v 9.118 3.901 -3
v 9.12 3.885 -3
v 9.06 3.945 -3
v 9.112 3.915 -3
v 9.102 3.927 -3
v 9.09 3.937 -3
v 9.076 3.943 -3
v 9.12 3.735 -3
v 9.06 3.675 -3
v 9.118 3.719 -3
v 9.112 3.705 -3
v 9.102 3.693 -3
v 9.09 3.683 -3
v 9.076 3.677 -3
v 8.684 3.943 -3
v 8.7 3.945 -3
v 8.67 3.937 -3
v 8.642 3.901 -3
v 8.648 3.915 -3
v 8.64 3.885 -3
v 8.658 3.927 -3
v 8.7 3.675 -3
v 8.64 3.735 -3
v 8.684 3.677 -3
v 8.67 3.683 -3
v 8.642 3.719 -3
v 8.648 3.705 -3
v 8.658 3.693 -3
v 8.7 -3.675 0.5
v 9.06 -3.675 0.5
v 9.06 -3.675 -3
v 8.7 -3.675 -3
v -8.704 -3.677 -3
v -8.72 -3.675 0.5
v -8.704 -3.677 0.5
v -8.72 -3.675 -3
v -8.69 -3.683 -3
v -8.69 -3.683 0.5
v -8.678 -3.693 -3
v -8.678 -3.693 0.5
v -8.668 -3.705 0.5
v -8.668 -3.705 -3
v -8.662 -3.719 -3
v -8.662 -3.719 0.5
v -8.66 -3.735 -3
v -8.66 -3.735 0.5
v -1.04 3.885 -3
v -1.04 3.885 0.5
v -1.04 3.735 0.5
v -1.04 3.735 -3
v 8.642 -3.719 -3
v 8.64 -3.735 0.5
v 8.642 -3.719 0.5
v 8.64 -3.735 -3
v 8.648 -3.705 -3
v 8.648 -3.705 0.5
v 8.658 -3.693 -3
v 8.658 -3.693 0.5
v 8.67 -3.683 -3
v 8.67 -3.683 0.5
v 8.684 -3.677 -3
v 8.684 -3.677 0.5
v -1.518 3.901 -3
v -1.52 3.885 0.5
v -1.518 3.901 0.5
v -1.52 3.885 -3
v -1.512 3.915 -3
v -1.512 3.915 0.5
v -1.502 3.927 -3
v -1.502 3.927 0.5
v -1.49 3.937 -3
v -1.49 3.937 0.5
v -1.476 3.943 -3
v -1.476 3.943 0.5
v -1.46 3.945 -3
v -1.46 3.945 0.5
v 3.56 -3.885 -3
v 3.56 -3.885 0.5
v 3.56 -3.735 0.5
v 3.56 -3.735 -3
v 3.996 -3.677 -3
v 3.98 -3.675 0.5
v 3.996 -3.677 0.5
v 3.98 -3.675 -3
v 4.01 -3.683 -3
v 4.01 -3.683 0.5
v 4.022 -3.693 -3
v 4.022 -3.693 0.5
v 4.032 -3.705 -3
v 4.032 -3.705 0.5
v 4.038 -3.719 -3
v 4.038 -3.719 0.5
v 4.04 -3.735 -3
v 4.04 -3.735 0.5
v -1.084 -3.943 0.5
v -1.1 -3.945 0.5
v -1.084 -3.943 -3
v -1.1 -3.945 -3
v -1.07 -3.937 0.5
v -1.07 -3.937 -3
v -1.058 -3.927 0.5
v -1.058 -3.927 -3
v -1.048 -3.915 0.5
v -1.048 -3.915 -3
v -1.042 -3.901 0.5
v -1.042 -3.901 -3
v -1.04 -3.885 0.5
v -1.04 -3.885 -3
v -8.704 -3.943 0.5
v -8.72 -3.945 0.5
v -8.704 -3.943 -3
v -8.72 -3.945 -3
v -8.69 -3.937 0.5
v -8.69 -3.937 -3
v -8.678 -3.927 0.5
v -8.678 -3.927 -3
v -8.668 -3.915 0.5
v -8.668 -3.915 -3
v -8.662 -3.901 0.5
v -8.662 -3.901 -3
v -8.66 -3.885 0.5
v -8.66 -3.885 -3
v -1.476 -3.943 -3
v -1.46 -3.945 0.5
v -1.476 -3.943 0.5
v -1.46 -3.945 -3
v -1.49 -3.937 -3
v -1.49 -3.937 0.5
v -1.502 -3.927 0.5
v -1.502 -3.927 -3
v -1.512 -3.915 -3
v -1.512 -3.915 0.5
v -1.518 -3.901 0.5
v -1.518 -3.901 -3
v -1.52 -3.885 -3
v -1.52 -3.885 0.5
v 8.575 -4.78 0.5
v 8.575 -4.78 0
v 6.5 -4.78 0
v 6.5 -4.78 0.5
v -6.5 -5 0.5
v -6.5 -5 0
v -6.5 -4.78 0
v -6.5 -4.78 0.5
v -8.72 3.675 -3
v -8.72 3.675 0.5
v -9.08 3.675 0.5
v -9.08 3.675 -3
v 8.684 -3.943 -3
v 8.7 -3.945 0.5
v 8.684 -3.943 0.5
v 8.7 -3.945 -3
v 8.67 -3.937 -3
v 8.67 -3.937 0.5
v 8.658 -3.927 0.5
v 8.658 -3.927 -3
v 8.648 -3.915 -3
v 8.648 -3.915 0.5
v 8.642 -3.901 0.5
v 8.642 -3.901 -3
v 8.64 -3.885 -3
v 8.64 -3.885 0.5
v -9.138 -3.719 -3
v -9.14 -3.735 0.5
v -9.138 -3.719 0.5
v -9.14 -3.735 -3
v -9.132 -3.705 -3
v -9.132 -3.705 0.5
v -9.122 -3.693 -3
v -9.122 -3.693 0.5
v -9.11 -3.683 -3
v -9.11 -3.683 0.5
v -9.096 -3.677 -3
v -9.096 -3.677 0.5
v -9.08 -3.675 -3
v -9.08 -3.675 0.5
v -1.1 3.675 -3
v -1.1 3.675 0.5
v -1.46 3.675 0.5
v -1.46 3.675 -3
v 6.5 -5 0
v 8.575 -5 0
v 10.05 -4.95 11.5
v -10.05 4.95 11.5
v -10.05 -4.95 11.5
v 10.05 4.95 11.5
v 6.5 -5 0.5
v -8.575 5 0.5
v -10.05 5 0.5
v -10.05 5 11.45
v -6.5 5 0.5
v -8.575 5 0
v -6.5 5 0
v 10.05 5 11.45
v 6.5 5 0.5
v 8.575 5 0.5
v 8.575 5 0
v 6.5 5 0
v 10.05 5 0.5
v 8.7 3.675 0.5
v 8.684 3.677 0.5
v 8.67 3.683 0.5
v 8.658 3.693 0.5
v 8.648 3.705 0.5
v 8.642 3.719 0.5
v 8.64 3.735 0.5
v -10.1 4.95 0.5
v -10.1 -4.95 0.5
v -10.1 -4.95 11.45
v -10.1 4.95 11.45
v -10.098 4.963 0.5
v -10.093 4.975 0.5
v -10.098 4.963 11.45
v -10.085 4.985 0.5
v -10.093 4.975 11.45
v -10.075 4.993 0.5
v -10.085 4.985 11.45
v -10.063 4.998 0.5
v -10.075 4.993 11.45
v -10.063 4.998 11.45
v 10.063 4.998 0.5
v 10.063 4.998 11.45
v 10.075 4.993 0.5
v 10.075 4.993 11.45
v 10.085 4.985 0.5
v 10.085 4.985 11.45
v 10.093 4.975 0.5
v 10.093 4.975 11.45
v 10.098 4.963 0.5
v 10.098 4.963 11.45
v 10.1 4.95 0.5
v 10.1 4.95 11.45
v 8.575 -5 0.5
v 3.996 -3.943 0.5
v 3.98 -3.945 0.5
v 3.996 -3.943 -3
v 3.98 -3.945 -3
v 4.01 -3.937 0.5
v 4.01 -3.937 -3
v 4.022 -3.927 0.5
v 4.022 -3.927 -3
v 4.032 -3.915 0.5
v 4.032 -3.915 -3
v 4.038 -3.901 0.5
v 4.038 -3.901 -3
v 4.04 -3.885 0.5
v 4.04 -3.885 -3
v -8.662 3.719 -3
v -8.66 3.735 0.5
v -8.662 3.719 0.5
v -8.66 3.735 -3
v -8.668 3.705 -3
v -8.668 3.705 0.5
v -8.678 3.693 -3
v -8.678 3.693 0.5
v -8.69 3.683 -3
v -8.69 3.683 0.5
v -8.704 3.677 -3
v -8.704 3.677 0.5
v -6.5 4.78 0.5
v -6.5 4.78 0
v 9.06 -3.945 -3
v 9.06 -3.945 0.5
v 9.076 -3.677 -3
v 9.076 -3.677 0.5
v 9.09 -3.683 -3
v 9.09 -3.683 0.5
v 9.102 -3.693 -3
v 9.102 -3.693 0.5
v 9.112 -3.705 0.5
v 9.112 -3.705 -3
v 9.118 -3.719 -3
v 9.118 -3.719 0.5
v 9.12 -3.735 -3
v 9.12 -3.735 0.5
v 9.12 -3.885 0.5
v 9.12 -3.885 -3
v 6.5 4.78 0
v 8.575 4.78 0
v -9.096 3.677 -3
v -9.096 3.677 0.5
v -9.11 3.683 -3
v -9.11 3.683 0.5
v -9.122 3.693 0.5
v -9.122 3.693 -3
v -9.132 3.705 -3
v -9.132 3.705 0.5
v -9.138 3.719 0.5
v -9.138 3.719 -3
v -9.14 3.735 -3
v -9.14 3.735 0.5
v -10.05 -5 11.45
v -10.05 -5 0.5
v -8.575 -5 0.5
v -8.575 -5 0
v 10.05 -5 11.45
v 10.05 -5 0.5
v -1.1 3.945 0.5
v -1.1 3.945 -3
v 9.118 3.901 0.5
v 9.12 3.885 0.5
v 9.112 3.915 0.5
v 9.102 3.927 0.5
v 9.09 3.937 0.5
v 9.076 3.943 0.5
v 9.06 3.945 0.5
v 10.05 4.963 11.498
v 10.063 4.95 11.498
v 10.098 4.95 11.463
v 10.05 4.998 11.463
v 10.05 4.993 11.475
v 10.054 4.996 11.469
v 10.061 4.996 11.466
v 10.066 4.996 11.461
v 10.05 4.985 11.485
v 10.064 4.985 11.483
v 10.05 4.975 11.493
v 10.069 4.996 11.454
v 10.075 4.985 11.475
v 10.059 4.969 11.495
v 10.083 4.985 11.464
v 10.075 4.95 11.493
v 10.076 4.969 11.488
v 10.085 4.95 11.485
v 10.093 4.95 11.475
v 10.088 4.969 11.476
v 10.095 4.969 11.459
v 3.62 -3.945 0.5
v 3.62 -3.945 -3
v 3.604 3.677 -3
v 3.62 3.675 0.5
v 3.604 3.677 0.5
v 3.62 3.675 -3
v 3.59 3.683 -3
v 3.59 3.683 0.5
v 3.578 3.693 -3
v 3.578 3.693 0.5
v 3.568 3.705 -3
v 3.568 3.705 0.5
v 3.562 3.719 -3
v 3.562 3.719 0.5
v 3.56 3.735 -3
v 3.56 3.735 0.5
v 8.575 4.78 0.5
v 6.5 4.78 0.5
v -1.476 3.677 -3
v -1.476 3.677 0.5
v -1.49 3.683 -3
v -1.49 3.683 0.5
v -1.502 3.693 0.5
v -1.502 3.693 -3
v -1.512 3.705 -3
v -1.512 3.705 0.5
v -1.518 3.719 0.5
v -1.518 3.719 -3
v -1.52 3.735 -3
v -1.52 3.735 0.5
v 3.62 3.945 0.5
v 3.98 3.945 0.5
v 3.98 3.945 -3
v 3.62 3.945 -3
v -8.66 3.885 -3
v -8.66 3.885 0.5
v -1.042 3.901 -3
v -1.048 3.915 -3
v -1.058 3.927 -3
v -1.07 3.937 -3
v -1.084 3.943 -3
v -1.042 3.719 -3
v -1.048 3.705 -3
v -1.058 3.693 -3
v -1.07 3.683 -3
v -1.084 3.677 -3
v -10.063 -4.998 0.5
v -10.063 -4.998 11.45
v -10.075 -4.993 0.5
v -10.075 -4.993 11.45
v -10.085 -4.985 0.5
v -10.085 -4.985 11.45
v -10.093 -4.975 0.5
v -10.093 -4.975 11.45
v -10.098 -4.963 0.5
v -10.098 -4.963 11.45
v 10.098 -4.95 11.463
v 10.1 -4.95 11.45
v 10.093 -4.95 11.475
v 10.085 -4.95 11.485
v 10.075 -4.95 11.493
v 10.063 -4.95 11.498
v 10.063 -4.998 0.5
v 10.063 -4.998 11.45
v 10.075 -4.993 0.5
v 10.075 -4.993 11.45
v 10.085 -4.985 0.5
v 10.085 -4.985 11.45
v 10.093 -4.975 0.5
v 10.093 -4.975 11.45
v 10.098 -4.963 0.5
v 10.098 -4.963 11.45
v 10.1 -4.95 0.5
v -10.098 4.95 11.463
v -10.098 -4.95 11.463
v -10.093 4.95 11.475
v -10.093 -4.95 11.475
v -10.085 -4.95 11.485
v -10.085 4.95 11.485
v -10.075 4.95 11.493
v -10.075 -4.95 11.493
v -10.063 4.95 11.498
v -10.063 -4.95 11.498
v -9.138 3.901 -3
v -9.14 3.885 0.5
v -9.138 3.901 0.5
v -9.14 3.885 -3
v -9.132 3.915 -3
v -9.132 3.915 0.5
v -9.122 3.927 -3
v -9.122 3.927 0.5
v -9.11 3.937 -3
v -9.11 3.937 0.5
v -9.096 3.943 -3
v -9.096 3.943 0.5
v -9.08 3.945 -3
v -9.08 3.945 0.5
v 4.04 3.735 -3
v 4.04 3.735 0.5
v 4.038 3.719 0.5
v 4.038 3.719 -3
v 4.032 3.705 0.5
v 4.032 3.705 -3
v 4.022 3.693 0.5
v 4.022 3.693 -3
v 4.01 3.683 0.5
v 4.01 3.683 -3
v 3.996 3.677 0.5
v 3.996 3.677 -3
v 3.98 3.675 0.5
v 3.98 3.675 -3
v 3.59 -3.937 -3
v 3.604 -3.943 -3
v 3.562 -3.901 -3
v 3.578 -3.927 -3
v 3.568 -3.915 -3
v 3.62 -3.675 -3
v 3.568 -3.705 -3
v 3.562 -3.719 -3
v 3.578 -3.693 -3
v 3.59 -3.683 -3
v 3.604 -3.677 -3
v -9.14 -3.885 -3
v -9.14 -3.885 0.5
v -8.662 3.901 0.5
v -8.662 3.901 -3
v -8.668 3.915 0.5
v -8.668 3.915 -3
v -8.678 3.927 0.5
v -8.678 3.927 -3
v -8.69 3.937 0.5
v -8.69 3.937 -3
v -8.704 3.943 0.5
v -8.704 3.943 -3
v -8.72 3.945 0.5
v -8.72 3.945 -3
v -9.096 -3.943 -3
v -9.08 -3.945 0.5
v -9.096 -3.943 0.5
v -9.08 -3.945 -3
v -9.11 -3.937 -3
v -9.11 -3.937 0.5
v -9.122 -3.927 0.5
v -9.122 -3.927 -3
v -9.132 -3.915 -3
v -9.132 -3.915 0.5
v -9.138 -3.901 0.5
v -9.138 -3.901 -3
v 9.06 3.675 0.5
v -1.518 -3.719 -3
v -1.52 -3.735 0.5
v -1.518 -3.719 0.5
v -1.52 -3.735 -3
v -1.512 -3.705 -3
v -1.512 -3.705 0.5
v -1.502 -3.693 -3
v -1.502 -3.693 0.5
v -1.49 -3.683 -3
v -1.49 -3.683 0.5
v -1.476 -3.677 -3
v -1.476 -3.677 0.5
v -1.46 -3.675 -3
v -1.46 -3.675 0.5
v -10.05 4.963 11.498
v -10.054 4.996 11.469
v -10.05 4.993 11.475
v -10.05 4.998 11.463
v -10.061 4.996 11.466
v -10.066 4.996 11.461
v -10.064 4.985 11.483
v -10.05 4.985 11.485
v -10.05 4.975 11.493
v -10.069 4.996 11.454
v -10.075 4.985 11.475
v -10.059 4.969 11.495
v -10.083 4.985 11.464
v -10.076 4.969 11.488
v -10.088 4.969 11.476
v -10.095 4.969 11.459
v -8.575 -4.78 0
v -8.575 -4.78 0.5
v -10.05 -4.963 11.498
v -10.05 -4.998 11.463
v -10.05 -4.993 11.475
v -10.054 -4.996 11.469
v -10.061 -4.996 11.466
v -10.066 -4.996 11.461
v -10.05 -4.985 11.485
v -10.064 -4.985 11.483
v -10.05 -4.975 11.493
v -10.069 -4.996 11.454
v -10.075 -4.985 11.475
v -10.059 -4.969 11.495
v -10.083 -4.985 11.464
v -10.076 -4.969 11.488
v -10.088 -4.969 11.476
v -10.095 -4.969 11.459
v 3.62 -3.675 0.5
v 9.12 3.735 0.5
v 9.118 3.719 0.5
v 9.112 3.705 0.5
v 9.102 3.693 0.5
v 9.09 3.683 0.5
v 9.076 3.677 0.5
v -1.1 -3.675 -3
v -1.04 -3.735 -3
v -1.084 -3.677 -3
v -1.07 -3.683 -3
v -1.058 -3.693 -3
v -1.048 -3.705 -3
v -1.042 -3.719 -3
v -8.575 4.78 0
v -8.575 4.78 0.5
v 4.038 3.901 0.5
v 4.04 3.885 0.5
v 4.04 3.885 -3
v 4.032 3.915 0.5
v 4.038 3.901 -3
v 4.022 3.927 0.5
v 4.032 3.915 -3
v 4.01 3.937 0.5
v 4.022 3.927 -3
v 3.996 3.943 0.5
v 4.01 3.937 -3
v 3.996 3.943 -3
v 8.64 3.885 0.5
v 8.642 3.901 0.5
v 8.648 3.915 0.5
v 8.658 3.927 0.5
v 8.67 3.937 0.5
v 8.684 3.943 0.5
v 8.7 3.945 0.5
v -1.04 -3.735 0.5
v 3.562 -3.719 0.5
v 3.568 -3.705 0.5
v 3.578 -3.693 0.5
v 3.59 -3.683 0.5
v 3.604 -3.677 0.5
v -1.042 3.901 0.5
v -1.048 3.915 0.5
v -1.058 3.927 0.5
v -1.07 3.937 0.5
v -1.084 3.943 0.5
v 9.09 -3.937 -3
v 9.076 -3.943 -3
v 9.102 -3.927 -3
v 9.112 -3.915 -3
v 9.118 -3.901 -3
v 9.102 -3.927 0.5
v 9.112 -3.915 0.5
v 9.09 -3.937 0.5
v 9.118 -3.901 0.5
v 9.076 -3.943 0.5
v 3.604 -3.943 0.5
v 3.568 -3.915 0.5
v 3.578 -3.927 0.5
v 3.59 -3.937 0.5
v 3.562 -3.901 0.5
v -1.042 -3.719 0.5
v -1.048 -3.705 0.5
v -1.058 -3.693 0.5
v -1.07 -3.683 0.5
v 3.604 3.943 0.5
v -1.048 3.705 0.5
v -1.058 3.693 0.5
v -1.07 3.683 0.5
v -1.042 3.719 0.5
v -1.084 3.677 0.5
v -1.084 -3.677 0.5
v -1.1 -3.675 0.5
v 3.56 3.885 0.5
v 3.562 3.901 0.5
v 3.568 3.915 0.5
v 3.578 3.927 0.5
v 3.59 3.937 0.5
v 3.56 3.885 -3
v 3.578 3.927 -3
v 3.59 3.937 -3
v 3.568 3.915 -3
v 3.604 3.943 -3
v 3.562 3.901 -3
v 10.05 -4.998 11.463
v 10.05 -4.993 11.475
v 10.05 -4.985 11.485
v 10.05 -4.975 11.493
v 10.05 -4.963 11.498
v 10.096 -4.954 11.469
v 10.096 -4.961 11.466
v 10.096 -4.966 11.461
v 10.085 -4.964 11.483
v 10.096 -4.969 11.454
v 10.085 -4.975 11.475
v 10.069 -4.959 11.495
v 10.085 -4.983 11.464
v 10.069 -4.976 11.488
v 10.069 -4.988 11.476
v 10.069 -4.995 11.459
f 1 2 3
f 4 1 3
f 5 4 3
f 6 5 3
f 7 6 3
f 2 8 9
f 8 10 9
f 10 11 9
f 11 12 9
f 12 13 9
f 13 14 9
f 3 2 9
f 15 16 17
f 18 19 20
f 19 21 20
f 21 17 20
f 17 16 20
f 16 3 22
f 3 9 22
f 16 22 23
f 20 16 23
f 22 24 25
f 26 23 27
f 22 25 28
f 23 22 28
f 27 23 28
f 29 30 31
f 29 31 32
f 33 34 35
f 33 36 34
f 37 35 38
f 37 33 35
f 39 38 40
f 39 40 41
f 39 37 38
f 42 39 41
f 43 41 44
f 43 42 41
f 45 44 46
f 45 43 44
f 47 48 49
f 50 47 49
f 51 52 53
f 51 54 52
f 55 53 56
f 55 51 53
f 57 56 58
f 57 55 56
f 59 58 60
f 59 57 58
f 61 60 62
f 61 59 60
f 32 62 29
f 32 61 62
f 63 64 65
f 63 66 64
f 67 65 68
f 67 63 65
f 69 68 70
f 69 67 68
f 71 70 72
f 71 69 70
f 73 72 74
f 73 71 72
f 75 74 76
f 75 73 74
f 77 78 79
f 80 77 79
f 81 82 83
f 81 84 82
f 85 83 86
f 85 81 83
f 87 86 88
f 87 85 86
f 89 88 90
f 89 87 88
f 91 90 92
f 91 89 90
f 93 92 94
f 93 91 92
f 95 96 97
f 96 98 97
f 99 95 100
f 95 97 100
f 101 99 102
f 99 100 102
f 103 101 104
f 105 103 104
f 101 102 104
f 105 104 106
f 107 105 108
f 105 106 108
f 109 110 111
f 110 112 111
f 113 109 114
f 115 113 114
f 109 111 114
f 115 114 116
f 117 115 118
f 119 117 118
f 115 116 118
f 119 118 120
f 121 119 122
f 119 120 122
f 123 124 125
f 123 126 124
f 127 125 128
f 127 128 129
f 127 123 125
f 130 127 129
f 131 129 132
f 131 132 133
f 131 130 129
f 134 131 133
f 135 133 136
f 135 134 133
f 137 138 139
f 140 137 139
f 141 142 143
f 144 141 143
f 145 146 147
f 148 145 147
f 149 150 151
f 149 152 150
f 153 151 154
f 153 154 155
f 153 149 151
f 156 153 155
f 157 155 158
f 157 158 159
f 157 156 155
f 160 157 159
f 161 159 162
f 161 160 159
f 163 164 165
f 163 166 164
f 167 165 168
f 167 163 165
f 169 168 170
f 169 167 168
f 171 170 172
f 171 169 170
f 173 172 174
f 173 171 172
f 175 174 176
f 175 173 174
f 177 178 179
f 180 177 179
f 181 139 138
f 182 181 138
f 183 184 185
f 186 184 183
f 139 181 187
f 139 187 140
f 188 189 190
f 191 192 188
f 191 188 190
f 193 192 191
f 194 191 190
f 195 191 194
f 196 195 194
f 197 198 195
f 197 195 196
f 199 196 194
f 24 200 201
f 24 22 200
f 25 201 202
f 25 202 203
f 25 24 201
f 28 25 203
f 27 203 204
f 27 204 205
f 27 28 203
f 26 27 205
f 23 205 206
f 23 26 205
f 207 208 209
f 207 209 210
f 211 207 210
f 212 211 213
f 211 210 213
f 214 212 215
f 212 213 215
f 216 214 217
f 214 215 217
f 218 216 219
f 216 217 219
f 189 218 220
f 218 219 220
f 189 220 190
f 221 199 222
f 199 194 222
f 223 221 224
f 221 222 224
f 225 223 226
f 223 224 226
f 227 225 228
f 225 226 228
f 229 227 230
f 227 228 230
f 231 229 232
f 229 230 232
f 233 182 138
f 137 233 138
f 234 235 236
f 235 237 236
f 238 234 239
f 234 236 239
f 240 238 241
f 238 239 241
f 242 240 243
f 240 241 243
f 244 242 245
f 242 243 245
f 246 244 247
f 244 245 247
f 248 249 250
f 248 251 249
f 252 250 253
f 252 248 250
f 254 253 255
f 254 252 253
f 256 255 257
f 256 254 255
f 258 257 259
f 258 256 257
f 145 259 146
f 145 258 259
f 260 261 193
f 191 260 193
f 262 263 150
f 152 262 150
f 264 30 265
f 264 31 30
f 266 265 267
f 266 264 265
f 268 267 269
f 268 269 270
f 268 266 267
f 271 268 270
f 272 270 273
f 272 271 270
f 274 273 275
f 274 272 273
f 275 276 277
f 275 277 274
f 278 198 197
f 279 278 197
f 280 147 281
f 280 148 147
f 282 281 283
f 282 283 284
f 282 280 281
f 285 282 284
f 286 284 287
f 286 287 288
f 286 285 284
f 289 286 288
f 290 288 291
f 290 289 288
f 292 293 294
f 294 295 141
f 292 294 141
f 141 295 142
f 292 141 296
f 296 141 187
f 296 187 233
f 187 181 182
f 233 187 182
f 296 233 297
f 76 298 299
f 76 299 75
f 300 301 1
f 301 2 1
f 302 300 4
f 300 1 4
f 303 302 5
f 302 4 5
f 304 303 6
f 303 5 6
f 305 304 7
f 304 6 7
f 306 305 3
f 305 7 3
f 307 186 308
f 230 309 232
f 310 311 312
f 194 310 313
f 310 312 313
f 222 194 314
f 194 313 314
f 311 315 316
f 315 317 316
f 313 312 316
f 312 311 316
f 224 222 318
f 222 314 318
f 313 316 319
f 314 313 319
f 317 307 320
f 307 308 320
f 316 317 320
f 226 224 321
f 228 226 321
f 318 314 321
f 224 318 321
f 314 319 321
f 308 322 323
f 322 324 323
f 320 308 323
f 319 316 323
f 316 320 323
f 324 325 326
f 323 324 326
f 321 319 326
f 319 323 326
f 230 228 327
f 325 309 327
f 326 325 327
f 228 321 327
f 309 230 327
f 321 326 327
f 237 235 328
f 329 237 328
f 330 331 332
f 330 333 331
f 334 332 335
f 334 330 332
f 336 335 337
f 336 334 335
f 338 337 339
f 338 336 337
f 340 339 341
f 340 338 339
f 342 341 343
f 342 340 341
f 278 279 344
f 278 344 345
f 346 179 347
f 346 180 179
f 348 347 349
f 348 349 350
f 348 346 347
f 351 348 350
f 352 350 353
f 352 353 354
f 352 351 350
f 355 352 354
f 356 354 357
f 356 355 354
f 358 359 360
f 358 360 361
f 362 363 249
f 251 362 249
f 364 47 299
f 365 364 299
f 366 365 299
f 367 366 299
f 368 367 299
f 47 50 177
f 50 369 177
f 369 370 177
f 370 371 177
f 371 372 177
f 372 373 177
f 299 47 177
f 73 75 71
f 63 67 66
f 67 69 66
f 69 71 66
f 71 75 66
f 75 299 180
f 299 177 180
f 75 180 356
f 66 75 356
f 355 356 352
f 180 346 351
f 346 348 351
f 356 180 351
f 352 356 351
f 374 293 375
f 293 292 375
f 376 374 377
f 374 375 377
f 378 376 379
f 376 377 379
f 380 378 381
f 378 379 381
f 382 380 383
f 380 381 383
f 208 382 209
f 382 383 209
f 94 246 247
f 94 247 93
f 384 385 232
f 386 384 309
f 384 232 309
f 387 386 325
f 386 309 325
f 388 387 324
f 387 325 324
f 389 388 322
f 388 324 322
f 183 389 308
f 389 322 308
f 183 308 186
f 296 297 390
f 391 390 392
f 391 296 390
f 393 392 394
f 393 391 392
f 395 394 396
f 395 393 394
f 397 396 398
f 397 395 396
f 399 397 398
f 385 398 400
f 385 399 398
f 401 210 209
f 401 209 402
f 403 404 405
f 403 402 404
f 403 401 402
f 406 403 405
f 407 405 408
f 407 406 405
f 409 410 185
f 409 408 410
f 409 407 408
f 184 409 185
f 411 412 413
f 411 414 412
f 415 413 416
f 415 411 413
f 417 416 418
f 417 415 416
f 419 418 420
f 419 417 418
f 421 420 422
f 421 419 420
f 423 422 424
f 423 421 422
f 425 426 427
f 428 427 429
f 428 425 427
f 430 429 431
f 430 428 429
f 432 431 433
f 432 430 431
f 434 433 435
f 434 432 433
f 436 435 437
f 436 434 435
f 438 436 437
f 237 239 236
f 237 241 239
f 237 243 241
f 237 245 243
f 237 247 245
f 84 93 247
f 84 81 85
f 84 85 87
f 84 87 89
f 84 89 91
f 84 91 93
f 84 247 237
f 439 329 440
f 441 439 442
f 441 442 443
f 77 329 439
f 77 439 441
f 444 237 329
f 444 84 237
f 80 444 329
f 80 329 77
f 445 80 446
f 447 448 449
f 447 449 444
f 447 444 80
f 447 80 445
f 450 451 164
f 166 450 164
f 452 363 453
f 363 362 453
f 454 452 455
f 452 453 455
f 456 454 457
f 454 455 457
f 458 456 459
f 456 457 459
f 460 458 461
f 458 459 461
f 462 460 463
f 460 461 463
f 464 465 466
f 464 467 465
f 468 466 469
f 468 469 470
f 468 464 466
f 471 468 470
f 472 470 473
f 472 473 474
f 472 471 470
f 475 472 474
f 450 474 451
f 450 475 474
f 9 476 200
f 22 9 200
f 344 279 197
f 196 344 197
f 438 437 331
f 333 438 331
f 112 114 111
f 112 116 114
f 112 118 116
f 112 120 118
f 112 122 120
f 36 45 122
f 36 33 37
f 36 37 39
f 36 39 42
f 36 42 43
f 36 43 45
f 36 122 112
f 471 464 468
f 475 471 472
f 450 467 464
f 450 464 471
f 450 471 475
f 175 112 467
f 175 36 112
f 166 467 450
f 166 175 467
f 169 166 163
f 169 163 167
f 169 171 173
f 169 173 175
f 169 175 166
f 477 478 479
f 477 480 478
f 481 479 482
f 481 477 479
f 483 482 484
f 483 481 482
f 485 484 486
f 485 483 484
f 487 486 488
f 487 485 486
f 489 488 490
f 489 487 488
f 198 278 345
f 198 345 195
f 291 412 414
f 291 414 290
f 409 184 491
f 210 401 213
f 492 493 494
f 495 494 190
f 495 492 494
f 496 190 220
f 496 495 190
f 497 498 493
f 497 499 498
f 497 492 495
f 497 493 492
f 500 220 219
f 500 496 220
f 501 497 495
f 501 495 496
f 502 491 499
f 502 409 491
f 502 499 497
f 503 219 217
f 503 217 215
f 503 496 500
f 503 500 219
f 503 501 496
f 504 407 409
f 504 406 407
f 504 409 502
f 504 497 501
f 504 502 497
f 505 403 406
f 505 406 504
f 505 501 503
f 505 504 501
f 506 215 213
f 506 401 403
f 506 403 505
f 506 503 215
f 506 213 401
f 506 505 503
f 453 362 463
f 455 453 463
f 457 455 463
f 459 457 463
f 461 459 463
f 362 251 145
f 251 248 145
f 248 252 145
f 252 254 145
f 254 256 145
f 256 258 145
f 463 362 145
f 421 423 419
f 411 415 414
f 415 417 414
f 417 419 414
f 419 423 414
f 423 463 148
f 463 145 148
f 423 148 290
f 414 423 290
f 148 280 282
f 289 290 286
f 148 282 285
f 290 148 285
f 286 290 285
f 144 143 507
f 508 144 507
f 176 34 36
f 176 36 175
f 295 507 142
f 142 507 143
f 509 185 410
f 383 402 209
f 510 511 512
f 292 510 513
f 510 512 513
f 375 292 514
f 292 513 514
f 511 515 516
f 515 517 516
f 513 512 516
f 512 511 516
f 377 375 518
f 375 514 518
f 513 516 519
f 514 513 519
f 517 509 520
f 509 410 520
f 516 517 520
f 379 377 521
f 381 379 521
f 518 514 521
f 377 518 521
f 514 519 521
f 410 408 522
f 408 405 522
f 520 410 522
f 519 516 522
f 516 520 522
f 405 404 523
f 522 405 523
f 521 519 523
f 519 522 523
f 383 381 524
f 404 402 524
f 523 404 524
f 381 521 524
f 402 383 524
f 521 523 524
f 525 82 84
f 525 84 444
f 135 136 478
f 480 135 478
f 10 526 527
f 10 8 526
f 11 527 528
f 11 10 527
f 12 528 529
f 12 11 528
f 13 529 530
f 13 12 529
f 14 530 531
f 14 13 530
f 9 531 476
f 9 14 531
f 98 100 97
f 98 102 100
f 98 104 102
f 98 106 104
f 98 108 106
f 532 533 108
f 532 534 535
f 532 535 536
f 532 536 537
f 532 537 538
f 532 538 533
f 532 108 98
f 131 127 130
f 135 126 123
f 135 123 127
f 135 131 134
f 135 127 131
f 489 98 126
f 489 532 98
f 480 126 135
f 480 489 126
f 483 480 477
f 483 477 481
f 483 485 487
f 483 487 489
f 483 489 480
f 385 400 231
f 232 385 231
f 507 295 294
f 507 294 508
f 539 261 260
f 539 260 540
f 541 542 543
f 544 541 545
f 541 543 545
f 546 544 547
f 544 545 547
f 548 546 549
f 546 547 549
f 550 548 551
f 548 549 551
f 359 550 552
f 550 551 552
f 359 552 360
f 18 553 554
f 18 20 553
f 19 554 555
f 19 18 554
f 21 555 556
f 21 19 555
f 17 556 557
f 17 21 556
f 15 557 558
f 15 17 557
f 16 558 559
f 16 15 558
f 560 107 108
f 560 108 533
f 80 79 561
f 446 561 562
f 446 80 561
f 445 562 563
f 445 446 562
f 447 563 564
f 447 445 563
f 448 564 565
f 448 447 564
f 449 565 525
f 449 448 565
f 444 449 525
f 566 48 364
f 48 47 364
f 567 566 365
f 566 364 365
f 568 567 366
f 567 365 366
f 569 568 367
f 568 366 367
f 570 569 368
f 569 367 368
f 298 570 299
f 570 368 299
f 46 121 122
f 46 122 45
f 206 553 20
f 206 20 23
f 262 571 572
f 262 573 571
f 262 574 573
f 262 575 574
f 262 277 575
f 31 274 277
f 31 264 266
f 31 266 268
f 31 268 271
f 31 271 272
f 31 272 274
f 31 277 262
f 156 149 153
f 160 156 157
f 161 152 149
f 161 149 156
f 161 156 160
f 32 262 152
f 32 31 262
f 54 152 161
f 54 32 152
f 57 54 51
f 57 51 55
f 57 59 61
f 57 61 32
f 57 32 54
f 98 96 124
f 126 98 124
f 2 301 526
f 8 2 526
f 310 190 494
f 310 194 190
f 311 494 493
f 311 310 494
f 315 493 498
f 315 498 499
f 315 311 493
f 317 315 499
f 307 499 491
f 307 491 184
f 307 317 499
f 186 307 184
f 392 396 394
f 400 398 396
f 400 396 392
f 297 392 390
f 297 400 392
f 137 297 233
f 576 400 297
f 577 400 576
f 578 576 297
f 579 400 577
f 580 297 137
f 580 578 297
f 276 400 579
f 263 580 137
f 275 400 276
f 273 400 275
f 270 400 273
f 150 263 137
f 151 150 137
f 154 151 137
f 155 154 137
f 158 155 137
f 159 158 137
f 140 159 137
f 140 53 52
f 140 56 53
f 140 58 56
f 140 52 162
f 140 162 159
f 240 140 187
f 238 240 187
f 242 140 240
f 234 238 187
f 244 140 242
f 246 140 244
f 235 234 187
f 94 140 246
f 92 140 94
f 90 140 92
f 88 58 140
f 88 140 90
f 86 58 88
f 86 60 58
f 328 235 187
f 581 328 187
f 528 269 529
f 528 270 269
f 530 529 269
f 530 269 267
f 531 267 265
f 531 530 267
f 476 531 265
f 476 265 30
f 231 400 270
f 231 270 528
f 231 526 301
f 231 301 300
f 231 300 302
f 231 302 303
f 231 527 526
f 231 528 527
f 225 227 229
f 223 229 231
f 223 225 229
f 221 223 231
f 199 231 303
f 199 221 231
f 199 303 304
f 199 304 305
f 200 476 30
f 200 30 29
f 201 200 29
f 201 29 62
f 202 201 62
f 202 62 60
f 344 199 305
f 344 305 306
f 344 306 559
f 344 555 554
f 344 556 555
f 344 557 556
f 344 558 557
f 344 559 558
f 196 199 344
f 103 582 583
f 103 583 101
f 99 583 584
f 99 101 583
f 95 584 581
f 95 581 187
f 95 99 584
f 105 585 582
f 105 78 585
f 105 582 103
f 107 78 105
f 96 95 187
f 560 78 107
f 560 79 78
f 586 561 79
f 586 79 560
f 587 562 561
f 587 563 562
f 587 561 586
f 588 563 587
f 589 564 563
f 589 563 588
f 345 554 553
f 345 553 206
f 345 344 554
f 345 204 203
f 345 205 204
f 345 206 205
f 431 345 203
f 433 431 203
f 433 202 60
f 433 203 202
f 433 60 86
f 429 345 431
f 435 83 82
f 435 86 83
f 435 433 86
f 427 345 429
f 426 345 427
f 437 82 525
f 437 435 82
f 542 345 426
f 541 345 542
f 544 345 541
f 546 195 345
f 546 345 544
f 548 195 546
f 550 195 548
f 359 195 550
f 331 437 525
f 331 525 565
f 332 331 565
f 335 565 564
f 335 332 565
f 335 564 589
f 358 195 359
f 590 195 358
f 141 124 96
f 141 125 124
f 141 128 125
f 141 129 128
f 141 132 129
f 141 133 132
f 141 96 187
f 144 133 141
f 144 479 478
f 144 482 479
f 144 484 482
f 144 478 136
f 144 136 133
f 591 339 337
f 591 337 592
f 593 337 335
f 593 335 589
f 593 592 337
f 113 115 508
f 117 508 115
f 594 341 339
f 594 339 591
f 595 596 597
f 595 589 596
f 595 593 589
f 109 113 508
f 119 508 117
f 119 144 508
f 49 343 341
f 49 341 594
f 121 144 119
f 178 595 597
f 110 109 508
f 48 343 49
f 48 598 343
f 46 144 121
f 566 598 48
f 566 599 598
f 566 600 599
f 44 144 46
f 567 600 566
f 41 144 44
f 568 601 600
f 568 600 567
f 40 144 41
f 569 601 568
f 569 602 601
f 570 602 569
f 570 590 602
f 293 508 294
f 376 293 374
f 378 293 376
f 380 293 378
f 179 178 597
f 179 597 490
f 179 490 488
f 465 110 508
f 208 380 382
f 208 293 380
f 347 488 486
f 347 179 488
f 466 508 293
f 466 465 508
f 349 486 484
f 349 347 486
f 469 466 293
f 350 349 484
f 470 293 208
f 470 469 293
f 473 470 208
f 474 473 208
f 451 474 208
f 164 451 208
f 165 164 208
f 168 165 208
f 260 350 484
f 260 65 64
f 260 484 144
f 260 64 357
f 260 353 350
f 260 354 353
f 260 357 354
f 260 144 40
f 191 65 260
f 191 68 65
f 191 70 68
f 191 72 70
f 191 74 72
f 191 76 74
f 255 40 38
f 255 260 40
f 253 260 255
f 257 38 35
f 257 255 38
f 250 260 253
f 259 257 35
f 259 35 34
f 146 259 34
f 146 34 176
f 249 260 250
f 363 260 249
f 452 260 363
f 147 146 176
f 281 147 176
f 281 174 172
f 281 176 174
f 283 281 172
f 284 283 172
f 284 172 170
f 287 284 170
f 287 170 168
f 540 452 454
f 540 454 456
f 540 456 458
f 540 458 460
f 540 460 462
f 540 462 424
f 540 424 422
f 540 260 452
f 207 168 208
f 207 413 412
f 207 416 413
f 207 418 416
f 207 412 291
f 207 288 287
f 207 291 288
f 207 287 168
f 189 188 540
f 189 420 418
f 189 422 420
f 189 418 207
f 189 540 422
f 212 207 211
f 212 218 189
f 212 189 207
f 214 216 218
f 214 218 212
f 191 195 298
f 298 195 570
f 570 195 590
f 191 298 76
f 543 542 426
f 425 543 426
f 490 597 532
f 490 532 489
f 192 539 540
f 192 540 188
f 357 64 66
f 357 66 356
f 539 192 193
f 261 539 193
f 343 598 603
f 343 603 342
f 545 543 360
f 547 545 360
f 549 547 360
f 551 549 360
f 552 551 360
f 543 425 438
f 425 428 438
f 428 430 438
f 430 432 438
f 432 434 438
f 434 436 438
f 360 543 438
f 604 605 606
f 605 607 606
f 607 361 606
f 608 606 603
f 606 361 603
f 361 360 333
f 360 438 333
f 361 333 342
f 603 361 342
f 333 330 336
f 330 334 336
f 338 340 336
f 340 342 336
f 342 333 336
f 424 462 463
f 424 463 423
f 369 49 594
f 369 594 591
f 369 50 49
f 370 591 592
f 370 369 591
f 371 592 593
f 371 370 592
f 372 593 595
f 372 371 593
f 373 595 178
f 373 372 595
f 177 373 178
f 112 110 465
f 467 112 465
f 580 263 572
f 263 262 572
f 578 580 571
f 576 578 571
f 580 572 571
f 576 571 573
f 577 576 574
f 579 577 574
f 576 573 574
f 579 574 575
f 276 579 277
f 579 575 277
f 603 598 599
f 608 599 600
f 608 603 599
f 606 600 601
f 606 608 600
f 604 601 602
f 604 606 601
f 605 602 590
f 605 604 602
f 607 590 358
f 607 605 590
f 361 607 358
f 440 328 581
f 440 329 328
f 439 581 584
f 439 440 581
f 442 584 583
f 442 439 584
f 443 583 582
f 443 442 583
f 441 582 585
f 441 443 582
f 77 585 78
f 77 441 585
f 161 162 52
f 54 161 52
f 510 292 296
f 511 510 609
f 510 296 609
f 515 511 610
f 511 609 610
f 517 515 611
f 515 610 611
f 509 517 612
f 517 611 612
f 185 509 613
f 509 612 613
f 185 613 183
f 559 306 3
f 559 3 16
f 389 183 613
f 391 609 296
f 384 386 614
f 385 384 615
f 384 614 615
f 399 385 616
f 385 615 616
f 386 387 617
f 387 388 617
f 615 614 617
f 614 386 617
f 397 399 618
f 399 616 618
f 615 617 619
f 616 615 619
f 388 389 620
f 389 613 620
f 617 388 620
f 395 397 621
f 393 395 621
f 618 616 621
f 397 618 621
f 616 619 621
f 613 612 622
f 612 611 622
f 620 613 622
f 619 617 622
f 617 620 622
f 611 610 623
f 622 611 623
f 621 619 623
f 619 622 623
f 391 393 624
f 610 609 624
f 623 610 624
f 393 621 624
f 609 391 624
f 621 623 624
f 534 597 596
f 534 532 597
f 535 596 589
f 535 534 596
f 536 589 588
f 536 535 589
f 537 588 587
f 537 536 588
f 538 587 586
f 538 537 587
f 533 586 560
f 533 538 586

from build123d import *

# Parameters (mm, degrees)
SKETCH1_W            = 20.2
SKETCH1_H            = 10
BOSS_EXTRUDE1_DEPTH  = 11.5
SKETCH2_W            = 13
SKETCH2_H            = 10
SKETCH2_W_2          = 1.525
CUT_EXTRUDE1_DEPTH   = 0.5
SKETCH3_W            = 17.15
SKETCH3_H            = 9.56
CUT_EXTRUDE2_DEPTH   = 0.5
SKETCH4_W            = 0.48
SKETCH4_H            = 0.27
BOSS_EXTRUDE2_DEPTH  = 3.5
FILLET1_R            = 0.06
FILLET1_OF_MIRROR1_R = 0.06
FILLET2_R            = 0.05


with BuildPart() as part:
    # Sketch1 → Boss-Extrude1 (new body)
    with BuildSketch(Plane.XY):
        Rectangle(SKETCH1_W, SKETCH1_H)
    extrude(amount=BOSS_EXTRUDE1_DEPTH)

    # Sketch2 → Cut-Extrude1 (cut)
    with BuildSketch(Plane(origin=(0, 0, 0), x_dir=(-1, 0, 0), z_dir=(0, 0, -1))):
        Rectangle(SKETCH2_W, SKETCH2_H)
        with Locations((-9.3375, 0)):
            Rectangle(SKETCH2_W_2, SKETCH2_H)
        with Locations((9.3375, 0)):
            Rectangle(SKETCH2_W_2, SKETCH2_H)
    extrude(amount=-CUT_EXTRUDE1_DEPTH, mode=Mode.SUBTRACT)

    # Sketch3 → Cut-Extrude2 (cut)
    with BuildSketch(Plane(origin=(0, 0, 0), x_dir=(-1, 0, 0), z_dir=(0, 0, -1))):
        Rectangle(SKETCH3_W, SKETCH3_H)
    extrude(amount=-CUT_EXTRUDE2_DEPTH, mode=Mode.SUBTRACT)

    # Sketch4 → Boss-Extrude2 (add)
    with BuildSketch(Plane(origin=(0, 0, 0.5), x_dir=(-1, 0, 0), z_dir=(0, 0, -1))):
        with Locations((8.9, -3.81)):
            Rectangle(SKETCH4_W, SKETCH4_H)
        with Locations((1.28, -3.81)):
            Rectangle(SKETCH4_W, SKETCH4_H)
        with Locations((-3.8, -3.81)):
            Rectangle(SKETCH4_W, SKETCH4_H)
        with Locations((-8.88, -3.81)):
            Rectangle(SKETCH4_W, SKETCH4_H)
    boss_extrude2 = extrude(amount=BOSS_EXTRUDE2_DEPTH)

    # Fillet1
    fillet1_edges = [part.edges().sort_by_distance(p)[0] for p in [
        (-1.52, -3.675, -1.25),
        (-1.52, -3.945, -1.25),
        (-1.04, -3.945, -1.25),
        (-1.04, -3.675, -1.25),
        (3.56, -3.675, -1.25),
        (3.56, -3.945, -1.25),
        (4.04, -3.945, -1.25),
        (4.04, -3.675, -1.25),
        (8.64, -3.675, -1.25),
        (8.64, -3.945, -1.25),
        (9.12, -3.945, -1.25),
        (9.12, -3.675, -1.25),
        (-9.14, -3.675, -1.25),
        (-9.14, -3.945, -1.25),
        (-8.66, -3.945, -1.25),
        (-8.66, -3.675, -1.25),
    ]]
    fillet(fillet1_edges, radius=FILLET1_R)

    # Mirror1: Boss-Extrude2 across plane
    add(boss_extrude2.mirror(Plane.ZX))

    # Fillet1 of Mirror1
    fillet1_of_mirror1_edges = [part.edges().sort_by_distance(p)[0] for p in [
        (-1.52, 3.675, -1.25),
        (-1.52, 3.945, -1.25),
        (-1.04, 3.945, -1.25),
        (-1.04, 3.675, -1.25),
        (3.56, 3.675, -1.25),
        (3.56, 3.945, -1.25),
        (4.04, 3.945, -1.25),
        (4.04, 3.675, -1.25),
        (8.64, 3.675, -1.25),
        (8.64, 3.945, -1.25),
        (9.12, 3.945, -1.25),
        (9.12, 3.675, -1.25),
        (-9.14, 3.675, -1.25),
        (-9.14, 3.945, -1.25),
        (-8.66, 3.945, -1.25),
        (-8.66, 3.675, -1.25),
    ]]
    fillet(fillet1_of_mirror1_edges, radius=FILLET1_OF_MIRROR1_R)

    # Fillet2
    fillet2_edges = [part.edges().sort_by_distance(p)[0] for p in [
        (-10.1, 0, 11.5),
        (0, -5, 11.5),
        (10.1, 0, 11.5),
        (0, 5, 11.5),
        (10.1, -5, 6),
        (-10.1, -5, 6),
        (-10.1, 5, 6),
        (10.1, 5, 6),
    ]]
    fillet(fillet2_edges, radius=FILLET2_R)


solid = part.part
